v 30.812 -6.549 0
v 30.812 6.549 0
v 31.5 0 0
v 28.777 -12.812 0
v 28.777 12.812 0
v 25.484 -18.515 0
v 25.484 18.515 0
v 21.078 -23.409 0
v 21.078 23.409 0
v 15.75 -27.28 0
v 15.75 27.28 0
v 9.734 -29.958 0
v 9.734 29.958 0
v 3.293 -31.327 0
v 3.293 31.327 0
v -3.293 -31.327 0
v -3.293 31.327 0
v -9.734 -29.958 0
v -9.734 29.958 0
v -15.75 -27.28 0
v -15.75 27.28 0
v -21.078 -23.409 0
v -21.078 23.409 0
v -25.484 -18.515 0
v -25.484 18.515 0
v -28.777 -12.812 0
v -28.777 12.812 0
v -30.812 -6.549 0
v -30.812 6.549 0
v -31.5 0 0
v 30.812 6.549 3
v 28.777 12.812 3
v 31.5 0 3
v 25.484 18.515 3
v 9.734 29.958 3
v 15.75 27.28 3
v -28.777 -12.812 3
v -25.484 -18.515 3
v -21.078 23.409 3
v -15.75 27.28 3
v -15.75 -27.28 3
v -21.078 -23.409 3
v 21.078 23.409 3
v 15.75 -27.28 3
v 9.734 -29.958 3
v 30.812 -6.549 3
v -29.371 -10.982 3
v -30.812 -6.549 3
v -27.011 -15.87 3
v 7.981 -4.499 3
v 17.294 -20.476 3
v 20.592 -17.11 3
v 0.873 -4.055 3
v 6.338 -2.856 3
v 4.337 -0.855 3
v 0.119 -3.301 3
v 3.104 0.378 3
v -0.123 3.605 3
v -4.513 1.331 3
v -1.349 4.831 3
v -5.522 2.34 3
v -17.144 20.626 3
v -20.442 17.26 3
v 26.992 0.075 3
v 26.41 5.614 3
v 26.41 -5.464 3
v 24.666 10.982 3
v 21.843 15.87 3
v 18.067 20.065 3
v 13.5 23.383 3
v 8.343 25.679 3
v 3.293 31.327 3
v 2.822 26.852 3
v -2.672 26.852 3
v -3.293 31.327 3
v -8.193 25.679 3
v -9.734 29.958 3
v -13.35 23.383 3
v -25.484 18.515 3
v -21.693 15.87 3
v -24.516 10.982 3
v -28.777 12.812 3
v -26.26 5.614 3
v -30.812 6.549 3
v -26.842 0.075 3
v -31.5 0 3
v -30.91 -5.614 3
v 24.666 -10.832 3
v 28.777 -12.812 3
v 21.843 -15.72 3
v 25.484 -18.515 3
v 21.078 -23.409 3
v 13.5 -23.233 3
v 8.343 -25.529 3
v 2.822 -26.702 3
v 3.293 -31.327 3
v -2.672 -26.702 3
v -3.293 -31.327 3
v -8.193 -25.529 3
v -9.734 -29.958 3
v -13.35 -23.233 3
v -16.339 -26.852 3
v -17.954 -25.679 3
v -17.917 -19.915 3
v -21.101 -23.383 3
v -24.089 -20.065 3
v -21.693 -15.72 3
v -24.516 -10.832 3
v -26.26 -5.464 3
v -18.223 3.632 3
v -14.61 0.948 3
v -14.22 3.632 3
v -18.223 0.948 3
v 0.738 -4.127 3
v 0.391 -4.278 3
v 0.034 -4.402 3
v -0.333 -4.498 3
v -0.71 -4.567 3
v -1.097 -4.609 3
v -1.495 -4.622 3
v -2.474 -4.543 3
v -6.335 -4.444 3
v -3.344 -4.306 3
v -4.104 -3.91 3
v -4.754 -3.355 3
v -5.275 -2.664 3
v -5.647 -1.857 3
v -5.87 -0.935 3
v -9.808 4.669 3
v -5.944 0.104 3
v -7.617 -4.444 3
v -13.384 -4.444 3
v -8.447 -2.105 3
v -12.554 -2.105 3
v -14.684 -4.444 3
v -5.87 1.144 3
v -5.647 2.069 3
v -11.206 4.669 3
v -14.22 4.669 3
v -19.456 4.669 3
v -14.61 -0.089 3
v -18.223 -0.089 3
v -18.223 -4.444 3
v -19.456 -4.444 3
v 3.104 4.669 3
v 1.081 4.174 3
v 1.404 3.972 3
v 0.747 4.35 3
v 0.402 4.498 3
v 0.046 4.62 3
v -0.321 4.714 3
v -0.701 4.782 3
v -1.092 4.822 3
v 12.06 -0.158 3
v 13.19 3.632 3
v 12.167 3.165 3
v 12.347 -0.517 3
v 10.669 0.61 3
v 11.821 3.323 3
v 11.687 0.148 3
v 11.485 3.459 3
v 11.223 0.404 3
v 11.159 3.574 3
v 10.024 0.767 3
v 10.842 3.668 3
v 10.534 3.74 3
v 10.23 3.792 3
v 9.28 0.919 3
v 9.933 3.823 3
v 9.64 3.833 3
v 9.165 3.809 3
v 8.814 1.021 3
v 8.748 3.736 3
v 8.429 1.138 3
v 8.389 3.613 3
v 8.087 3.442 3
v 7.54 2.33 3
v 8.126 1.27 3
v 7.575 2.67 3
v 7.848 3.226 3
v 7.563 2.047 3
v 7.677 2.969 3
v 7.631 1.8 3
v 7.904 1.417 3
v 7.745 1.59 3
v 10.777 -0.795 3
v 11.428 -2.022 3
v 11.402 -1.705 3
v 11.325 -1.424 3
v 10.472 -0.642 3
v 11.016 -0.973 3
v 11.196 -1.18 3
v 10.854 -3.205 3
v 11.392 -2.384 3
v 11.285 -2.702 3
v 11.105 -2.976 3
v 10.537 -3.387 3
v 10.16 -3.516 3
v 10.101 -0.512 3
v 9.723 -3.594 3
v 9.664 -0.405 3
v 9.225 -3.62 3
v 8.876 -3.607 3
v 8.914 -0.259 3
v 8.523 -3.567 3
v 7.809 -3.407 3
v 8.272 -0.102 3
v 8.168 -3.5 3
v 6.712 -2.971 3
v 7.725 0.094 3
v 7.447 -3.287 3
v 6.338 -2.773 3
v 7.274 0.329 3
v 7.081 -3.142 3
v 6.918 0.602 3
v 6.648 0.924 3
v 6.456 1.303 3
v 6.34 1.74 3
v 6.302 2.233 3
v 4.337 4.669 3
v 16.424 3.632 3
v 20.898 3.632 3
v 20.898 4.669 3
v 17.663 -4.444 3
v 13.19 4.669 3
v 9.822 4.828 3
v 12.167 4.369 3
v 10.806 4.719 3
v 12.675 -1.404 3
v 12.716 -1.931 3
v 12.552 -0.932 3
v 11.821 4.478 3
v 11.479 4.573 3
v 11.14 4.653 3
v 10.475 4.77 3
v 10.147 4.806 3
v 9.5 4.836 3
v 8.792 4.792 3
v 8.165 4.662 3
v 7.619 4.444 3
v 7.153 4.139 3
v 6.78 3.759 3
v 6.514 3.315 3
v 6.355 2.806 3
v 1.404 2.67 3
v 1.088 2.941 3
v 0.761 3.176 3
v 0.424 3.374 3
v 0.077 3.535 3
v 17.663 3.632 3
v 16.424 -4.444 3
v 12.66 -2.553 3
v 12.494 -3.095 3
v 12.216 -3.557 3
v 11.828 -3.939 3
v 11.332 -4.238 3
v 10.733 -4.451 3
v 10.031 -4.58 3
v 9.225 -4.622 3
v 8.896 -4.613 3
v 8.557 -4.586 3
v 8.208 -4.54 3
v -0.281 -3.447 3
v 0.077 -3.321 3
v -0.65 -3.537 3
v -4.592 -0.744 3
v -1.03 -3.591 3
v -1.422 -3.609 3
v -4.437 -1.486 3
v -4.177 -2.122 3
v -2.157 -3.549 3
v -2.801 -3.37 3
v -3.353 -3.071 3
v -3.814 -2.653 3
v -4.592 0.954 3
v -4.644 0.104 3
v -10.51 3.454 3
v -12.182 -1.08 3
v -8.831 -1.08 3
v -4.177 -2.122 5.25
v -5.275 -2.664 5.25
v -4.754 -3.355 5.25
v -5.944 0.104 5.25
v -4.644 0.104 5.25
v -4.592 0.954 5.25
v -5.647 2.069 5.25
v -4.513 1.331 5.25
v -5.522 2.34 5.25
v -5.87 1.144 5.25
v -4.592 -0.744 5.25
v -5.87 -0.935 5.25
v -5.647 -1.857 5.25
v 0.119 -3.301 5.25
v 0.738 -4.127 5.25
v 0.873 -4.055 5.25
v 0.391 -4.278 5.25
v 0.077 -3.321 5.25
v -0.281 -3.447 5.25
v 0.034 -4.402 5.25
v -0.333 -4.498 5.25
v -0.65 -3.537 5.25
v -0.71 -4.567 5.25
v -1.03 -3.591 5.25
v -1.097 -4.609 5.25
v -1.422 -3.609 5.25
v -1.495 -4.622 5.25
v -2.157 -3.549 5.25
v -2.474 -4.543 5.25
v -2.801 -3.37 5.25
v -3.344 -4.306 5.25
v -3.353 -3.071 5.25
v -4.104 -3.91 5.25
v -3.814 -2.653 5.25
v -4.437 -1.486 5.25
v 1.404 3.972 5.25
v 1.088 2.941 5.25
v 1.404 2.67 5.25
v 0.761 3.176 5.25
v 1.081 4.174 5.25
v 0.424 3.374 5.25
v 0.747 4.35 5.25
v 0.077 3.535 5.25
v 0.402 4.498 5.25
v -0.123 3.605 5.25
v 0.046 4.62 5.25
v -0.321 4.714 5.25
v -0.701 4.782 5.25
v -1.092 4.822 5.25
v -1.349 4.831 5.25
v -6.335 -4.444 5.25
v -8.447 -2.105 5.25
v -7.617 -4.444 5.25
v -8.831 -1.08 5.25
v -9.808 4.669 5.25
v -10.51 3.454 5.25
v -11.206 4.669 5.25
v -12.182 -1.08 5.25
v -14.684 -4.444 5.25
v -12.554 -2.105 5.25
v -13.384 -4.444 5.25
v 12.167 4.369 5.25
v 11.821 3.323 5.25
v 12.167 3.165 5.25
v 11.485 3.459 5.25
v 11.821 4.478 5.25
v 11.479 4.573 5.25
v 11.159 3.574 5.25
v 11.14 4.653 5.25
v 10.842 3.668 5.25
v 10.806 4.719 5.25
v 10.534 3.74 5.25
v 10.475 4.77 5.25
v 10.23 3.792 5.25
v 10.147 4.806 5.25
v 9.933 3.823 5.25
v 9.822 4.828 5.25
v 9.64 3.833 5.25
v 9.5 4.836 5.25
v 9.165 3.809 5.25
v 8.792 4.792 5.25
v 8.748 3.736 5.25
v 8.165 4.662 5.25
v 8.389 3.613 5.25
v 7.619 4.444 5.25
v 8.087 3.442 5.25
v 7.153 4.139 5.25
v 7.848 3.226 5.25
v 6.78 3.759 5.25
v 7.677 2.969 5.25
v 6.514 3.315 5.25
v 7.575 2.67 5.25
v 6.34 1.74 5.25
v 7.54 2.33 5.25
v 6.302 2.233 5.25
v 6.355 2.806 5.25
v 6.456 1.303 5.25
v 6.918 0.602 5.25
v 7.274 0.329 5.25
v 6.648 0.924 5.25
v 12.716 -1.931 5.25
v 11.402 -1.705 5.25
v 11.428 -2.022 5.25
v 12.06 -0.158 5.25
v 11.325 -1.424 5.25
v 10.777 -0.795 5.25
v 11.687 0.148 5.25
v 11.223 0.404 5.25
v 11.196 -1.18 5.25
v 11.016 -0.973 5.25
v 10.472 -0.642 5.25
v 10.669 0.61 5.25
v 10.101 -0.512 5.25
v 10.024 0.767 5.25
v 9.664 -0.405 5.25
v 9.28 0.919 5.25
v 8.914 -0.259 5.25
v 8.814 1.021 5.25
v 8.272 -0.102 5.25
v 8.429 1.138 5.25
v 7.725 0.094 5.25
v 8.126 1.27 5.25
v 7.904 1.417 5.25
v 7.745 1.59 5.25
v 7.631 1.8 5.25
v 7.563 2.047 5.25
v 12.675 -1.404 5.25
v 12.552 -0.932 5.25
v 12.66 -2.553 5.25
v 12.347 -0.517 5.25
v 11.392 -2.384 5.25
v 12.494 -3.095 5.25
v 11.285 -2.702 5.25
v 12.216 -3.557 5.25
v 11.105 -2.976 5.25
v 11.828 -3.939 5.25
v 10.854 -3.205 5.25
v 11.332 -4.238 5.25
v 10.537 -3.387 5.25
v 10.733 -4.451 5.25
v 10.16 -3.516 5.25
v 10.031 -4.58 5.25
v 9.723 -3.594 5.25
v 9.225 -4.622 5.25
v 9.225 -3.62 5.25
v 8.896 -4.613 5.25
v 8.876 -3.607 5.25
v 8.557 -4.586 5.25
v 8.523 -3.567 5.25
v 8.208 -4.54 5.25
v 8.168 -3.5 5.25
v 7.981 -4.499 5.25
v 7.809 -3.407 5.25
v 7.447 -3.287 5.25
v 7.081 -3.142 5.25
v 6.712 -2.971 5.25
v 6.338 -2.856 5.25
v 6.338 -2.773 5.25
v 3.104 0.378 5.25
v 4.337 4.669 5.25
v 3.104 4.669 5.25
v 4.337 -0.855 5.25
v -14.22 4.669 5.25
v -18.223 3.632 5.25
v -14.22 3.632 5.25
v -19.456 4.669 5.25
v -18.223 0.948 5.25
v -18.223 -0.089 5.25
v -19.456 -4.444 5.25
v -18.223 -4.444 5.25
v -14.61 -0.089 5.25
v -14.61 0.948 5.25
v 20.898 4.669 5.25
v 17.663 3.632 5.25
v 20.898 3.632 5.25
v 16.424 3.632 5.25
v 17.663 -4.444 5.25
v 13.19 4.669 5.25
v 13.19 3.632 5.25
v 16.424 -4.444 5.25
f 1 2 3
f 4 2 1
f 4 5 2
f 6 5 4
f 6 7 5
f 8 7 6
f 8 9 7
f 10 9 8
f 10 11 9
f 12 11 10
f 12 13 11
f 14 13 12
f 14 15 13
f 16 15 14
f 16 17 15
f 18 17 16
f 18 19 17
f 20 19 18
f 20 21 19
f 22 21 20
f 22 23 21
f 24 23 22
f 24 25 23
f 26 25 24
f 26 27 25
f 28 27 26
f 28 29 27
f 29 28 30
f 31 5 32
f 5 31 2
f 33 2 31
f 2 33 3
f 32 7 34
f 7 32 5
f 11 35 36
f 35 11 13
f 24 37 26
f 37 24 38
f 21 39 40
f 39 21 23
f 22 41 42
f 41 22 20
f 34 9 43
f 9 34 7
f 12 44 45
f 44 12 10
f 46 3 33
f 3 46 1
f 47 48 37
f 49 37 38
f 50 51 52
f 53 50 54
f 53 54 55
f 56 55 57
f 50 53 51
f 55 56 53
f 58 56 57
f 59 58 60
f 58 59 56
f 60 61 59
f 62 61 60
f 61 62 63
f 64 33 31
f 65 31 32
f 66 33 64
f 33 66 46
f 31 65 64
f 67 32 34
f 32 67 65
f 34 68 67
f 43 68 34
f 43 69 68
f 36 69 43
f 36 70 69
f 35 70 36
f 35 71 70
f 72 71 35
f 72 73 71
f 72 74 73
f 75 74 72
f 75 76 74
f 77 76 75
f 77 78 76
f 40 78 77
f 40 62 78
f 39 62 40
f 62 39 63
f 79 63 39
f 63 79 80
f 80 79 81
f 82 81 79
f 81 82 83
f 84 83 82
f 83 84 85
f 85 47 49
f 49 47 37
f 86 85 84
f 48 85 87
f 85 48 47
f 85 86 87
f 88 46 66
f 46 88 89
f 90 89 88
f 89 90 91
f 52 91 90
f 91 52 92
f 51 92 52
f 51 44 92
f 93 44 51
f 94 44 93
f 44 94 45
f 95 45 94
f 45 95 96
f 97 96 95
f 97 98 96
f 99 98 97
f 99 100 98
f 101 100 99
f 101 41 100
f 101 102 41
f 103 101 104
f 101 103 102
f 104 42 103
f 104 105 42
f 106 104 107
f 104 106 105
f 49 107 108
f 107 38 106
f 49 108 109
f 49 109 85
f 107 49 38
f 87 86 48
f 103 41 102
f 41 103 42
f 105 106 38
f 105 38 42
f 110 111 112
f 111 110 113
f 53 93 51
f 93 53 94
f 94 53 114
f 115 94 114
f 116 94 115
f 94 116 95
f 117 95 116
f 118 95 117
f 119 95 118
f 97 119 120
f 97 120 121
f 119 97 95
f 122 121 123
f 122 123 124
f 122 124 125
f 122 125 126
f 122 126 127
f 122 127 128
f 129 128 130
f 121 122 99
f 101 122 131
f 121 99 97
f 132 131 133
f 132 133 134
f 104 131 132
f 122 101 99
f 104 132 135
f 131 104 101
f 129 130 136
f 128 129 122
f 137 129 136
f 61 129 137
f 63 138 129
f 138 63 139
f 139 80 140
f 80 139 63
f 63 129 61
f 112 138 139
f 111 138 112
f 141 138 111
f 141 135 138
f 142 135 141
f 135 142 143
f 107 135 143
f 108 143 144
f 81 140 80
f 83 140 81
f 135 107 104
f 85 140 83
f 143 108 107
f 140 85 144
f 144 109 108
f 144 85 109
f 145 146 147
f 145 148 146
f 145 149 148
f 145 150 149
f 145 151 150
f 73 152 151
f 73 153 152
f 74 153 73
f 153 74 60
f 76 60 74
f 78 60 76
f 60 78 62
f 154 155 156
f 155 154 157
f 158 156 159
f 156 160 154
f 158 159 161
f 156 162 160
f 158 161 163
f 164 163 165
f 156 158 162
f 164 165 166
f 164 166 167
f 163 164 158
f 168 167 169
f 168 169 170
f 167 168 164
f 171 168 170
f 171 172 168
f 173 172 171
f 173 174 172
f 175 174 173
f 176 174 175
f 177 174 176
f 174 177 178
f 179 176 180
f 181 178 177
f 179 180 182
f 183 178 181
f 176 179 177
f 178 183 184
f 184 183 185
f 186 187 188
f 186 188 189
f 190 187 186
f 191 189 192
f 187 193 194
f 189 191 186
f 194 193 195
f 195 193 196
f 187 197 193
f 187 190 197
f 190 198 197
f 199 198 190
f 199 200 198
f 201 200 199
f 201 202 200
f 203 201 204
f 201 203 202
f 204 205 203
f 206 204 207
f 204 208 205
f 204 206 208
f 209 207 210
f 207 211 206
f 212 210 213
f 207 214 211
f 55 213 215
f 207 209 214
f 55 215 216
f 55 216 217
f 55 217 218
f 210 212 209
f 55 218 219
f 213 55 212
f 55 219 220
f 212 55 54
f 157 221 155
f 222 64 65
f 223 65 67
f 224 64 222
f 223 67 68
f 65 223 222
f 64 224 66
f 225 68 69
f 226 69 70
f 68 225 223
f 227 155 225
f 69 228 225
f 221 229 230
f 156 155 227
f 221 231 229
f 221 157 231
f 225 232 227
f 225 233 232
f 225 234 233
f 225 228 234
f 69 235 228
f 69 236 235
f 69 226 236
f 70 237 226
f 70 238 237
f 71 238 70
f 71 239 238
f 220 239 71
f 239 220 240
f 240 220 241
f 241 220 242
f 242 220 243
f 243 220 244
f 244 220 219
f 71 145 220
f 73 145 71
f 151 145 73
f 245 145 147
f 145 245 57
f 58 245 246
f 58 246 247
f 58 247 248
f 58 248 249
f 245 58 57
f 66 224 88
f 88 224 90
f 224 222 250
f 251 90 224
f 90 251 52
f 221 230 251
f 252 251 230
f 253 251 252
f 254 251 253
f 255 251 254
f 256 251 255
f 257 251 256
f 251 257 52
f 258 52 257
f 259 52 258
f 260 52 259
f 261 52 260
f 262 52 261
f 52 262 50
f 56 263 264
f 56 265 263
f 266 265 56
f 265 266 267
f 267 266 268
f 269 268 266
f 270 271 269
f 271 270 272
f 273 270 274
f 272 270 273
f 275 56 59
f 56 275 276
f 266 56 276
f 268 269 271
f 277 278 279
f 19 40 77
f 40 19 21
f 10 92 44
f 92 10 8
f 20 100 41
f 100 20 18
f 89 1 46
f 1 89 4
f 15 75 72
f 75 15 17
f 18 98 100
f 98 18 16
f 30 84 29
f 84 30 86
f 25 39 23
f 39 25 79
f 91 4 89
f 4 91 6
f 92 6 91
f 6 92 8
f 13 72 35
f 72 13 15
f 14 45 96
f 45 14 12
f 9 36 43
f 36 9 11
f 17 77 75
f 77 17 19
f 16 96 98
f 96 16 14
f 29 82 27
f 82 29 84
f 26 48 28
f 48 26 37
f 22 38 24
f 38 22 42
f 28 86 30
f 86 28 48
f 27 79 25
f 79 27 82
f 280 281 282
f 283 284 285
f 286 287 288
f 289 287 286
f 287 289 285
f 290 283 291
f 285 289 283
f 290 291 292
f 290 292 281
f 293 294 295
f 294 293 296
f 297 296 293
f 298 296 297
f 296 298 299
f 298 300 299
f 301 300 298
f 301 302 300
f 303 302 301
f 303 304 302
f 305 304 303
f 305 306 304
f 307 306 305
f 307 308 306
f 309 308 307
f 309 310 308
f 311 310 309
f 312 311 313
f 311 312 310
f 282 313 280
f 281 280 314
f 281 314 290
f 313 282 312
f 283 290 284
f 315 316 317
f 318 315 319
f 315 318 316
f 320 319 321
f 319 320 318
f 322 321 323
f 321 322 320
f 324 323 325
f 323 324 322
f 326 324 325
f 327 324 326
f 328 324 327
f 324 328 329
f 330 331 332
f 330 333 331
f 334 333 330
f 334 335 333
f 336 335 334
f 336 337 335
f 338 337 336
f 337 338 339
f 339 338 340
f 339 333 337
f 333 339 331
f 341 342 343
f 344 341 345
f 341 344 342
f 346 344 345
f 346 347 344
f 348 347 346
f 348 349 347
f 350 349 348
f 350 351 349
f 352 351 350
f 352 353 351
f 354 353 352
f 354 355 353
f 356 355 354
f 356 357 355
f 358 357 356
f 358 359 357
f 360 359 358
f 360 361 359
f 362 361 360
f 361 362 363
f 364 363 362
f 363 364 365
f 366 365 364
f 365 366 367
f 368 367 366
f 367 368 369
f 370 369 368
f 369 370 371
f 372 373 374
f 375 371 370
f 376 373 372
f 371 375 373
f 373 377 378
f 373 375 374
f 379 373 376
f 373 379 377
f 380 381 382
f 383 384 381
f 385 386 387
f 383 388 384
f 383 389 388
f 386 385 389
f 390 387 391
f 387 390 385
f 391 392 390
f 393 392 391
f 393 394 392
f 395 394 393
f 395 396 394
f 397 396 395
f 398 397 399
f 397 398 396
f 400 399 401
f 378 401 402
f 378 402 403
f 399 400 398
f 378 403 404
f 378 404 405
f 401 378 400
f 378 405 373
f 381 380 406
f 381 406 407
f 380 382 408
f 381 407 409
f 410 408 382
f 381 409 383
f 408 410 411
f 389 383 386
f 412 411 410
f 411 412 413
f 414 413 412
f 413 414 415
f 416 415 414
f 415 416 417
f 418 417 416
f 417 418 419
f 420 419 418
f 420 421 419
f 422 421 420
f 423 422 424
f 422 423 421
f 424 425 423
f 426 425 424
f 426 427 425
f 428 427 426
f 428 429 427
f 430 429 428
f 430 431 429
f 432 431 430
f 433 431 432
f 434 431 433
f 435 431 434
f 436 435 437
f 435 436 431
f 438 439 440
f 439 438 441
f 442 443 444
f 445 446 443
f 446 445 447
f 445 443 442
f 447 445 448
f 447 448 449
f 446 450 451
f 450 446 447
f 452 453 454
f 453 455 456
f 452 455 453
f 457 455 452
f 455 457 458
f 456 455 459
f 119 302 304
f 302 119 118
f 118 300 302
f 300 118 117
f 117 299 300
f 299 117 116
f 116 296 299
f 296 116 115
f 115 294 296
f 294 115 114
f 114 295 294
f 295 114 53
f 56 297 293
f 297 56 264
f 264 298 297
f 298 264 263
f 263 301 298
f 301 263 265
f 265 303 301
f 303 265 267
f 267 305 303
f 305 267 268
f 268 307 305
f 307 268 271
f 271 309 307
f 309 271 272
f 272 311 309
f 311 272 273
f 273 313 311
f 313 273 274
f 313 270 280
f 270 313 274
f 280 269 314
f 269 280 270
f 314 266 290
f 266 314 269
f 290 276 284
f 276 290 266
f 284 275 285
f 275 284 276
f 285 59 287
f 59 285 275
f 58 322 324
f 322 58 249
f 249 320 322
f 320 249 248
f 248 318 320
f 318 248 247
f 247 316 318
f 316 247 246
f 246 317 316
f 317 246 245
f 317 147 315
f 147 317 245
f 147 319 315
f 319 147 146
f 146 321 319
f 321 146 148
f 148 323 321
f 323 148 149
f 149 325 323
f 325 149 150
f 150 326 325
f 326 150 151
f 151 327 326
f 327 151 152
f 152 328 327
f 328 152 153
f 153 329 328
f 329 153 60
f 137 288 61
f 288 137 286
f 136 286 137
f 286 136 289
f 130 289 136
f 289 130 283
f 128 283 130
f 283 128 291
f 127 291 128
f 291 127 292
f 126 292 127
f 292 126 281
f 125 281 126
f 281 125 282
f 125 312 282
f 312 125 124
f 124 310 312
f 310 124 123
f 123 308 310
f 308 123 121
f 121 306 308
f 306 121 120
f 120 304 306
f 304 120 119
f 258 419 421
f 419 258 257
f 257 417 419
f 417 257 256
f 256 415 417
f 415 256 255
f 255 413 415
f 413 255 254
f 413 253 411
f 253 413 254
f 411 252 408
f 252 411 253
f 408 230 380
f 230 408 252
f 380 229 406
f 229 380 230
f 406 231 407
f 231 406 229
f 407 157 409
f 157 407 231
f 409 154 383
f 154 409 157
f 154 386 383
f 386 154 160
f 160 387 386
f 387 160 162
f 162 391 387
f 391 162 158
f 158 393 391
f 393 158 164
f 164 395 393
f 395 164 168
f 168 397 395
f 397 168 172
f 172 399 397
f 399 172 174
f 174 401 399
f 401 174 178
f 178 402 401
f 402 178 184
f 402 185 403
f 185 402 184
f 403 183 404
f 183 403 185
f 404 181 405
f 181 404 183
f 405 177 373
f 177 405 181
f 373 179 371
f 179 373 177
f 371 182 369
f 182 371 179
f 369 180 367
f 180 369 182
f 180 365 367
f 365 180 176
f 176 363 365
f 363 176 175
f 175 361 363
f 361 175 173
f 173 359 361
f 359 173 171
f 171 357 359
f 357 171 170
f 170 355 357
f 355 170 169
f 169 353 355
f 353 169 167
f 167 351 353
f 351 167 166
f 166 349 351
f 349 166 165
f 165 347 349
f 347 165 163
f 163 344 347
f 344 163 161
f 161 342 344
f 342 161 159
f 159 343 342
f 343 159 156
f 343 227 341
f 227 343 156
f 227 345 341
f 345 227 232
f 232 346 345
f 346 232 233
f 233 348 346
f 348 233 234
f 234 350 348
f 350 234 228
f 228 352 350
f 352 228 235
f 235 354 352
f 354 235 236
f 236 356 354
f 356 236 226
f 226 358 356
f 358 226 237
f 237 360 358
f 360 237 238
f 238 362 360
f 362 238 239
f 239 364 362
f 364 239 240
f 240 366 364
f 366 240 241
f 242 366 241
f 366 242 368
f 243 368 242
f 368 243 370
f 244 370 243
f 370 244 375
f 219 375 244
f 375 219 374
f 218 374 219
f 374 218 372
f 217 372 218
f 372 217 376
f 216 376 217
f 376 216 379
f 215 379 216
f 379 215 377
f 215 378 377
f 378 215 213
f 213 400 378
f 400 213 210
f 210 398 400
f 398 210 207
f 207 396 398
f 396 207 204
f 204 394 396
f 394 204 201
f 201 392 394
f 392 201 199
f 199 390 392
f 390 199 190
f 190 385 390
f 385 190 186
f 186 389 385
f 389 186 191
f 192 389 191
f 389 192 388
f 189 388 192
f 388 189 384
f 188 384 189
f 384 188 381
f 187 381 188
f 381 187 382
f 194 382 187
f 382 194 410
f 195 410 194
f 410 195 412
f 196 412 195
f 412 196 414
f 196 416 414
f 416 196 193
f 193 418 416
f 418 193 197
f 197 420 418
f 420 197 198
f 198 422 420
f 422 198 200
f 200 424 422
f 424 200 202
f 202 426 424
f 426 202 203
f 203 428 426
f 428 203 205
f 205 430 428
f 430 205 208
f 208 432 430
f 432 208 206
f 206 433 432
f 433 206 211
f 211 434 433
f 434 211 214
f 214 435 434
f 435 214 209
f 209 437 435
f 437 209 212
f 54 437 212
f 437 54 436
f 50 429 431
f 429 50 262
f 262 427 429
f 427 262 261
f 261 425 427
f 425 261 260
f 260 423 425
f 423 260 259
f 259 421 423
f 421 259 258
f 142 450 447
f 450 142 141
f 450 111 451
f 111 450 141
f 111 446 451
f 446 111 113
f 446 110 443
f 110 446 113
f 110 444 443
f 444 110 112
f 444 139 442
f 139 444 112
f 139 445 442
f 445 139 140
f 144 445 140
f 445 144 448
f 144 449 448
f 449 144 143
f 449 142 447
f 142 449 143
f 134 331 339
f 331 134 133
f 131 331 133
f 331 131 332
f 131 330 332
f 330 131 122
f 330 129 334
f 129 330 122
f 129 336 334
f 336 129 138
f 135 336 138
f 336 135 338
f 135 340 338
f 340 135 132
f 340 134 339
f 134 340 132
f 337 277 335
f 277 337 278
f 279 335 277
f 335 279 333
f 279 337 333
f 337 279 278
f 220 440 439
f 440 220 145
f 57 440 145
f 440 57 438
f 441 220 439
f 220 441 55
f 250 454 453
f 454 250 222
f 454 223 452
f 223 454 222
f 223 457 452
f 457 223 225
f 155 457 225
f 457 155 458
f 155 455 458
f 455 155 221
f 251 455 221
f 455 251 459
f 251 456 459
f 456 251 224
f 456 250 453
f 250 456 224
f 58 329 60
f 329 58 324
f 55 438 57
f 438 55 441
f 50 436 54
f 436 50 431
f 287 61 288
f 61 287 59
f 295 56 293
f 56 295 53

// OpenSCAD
translate(v = [0, 0, 3.0]) {
	difference() {
		union() {
			translate(v = [0, 0, -3.0]) {
				cylinder(h = 3.0, r = 31.5);
			}
			linear_extrude(height = 2.25) {
				text(font = "Mic 32Bold", halign = "center", size = 9, text = "FACIST", valign = "center");
			}
		}
		minkowski() {
			union() {
				difference() {
					cylinder(h = 3.0, r = 31.5);
					cylinder(h = 3.0, r = 27.0);
				}
				rotate(a = [0, 0, -45]) {
					translate(v = [-29.25, 0, 0]) {
						translate(v = [0, -2.25, 0]) {
							cube(size = [58.5, 4.5, 3.0]);
						}
					}
				}
			}
			cube(size = [0.15, 0.15, 0.15]);
		}
	}
}
